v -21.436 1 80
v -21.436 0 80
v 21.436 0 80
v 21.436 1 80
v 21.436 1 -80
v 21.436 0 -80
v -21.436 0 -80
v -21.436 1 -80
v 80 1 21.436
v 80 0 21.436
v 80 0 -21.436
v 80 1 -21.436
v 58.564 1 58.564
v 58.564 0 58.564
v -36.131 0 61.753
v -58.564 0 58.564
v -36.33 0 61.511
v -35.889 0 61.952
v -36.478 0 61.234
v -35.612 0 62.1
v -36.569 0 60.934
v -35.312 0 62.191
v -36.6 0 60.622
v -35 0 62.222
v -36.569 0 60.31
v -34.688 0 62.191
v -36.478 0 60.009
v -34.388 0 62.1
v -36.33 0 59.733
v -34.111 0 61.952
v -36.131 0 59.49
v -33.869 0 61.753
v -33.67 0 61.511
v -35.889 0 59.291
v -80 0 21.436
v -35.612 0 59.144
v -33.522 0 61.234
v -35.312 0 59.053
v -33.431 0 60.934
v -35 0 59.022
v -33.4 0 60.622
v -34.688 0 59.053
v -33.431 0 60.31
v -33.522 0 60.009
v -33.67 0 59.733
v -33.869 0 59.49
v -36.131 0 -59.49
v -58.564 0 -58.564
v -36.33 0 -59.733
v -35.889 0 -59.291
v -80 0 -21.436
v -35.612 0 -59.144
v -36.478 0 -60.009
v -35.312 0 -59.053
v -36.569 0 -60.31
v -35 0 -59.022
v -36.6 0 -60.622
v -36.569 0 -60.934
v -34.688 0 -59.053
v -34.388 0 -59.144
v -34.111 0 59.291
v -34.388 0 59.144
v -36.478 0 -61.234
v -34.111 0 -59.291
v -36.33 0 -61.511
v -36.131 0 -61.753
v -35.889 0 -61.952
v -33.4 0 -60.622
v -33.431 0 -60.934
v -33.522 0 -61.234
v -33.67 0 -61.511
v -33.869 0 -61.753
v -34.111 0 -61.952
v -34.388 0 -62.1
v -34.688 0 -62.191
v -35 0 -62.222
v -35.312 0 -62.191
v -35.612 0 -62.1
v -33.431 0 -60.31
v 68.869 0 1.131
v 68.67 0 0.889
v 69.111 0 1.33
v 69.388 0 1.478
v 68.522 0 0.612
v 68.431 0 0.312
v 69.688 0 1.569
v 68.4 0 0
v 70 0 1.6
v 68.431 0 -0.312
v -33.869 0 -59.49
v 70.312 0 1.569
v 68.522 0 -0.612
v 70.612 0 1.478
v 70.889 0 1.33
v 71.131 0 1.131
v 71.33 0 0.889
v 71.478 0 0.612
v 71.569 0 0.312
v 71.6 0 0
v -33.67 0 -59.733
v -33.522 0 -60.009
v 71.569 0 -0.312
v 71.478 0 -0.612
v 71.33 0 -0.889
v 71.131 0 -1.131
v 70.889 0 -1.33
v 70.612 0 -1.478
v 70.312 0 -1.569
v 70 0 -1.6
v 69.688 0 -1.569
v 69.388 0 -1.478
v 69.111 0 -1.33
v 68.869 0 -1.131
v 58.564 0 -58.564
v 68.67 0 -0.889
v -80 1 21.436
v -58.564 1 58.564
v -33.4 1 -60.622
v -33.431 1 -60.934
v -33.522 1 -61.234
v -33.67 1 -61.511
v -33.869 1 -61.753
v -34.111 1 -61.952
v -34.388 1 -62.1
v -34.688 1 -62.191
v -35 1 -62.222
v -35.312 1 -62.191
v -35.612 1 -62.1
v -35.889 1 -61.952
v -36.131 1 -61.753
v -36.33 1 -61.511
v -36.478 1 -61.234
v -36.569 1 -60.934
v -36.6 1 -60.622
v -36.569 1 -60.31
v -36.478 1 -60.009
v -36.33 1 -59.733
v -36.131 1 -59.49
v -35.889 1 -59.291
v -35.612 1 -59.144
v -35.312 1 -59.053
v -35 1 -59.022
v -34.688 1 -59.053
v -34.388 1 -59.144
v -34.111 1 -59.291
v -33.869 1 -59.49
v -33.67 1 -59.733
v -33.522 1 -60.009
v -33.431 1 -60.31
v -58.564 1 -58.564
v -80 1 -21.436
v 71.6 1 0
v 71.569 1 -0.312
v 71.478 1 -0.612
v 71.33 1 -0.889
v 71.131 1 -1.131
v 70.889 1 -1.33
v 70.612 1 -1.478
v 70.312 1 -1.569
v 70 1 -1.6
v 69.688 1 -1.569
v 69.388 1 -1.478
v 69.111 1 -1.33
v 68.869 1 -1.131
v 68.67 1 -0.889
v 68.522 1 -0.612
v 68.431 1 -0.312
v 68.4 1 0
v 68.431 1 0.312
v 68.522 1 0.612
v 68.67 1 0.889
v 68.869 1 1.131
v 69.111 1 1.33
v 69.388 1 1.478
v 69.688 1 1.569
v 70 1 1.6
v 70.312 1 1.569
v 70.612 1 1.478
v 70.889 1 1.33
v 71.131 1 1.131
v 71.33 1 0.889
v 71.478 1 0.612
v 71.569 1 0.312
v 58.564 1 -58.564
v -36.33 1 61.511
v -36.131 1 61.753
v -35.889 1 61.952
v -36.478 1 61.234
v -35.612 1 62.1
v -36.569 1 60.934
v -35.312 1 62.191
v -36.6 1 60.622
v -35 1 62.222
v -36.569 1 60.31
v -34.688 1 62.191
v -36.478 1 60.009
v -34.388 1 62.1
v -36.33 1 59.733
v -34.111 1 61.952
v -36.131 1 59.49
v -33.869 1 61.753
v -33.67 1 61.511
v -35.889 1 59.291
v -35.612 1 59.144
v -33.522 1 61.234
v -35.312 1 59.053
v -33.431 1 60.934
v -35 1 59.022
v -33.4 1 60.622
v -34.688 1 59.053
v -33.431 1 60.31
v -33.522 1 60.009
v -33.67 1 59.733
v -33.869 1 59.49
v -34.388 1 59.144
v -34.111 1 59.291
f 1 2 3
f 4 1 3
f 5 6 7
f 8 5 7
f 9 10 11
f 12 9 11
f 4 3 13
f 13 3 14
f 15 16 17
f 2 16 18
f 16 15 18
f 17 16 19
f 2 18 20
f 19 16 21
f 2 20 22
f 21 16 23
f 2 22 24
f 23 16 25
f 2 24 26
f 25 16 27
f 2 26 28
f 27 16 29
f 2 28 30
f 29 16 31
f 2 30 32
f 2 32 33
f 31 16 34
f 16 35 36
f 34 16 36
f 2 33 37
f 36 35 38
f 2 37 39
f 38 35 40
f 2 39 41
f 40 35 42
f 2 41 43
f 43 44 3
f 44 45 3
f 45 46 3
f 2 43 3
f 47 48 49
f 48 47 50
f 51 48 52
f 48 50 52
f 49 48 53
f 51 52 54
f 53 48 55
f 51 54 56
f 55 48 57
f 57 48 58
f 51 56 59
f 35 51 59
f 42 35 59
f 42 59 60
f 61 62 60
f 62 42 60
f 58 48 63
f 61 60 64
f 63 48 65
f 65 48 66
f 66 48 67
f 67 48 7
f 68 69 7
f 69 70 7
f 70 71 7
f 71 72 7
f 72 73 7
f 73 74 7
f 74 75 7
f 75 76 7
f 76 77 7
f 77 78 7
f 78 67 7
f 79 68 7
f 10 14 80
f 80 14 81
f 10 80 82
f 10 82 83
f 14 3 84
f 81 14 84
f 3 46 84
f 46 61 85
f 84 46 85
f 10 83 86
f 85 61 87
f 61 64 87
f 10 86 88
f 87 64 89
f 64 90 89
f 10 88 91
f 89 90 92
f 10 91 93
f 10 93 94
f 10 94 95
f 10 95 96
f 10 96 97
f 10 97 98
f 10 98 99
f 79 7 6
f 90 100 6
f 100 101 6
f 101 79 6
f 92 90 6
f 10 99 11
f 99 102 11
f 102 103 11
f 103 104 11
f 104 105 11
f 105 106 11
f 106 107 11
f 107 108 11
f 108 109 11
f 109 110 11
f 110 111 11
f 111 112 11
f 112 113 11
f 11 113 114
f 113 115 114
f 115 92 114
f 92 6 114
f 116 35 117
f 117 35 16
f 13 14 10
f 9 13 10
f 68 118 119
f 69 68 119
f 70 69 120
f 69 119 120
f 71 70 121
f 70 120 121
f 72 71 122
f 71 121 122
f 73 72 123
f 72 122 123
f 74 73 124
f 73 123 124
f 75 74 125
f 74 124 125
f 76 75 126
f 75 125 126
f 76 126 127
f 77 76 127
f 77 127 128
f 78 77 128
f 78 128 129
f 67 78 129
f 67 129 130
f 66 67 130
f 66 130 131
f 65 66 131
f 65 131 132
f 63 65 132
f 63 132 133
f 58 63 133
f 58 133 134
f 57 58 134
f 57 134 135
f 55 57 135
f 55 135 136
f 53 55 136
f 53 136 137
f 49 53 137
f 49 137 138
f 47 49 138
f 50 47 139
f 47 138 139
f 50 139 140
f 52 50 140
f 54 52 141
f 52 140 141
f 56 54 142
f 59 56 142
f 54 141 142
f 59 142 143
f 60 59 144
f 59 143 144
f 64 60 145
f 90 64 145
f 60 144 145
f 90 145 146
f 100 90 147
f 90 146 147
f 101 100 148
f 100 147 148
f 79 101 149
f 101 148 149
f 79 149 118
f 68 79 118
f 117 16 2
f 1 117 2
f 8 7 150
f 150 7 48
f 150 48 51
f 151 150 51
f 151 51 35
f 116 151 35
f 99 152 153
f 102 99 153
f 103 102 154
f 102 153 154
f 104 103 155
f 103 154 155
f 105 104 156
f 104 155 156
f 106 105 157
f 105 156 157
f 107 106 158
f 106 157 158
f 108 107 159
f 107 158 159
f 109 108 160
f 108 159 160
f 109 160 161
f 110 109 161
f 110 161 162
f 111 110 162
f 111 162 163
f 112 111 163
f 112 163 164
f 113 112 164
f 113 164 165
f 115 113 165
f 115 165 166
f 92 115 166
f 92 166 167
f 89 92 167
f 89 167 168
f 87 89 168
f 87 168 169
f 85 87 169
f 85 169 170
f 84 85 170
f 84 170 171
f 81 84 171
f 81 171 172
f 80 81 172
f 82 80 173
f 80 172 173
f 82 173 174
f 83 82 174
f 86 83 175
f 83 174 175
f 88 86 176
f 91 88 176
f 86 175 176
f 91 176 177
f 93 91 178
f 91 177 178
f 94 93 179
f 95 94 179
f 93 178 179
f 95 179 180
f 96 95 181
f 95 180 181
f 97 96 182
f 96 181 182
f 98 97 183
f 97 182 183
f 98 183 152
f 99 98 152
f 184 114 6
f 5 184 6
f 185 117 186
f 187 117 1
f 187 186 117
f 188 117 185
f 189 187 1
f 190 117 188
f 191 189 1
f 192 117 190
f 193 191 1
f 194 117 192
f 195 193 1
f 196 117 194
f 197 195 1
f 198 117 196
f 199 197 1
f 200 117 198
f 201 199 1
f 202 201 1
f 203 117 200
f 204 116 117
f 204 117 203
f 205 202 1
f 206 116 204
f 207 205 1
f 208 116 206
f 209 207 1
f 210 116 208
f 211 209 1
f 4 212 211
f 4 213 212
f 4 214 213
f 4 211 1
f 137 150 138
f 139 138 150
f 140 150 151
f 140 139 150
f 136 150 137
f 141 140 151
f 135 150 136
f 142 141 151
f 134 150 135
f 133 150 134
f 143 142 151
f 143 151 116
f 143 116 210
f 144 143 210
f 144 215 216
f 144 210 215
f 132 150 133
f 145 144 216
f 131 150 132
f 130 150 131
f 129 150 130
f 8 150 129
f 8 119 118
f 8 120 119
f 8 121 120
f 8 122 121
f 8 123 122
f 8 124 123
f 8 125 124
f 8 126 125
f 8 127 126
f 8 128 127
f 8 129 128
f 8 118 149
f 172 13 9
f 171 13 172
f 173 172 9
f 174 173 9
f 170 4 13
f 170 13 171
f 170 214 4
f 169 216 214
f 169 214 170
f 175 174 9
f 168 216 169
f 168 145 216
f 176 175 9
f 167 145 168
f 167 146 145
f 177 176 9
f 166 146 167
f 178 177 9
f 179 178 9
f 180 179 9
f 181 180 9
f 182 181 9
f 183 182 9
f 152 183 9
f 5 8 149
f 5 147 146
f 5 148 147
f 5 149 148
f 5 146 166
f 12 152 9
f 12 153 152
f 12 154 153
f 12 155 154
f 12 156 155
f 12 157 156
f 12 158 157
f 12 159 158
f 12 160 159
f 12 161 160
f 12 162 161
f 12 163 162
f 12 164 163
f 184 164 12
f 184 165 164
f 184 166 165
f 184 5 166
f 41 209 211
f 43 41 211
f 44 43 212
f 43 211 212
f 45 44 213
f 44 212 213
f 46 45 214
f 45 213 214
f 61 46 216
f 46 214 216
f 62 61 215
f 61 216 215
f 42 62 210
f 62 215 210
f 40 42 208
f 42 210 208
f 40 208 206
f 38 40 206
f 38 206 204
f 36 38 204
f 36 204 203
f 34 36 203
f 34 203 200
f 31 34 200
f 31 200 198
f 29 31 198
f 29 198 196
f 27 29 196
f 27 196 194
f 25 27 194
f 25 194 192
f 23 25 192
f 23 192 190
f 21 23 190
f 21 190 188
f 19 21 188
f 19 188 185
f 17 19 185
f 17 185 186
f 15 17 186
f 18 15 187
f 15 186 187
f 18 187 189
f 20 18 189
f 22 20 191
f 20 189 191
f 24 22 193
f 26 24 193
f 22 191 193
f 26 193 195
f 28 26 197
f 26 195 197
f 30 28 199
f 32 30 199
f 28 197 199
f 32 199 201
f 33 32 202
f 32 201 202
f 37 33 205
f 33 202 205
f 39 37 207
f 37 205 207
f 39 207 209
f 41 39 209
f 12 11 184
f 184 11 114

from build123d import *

# Parameters (mm, degrees)
EXTRUDE_1_DEPTH     = 1
CUT_EXTRUDE_1_REACH = 3
SKETCH_2_R          = 1.6
CUT_EXTRUDE_2_REACH = 3
SKETCH_3_R          = 1.6
CUT_EXTRUDE_3_REACH = 3
SKETCH_4_R          = 1.6


with BuildPart() as part:
    # ｽｹｯﾁ1 → ﾎﾞｽ - 押し出し1 (new body)
    with BuildSketch(Plane(origin=(0, 0, 0), x_dir=(1, 0, 0), z_dir=(0, 1, 0))):
        Polygon((-80, -21.435935394), (-58.564064606, -58.564064606), (-21.435935394, -80), (21.435935394, -80), (58.564064606, -58.564064606), (80, -21.435935394), (80, 21.435935394), (58.564064606, 58.564064606), (21.435935394, 80), (-21.435935394, 80), (-58.564064606, 58.564064606), (-80, 21.435935394), align=None)
    extrude(amount=EXTRUDE_1_DEPTH)

    # ｽｹｯﾁ2 → ｶｯﾄ - 押し出し1 (cut, up to next)
    with BuildSketch(Plane(origin=(0, 1, 0), x_dir=(1, 0, 0), z_dir=(0, 1, 0)), mode=Mode.PRIVATE) as cut_extrude_1_sk1:
        with Locations((-35, 60.621778265)):
            Circle(SKETCH_2_R)
    cut_extrude_1_tool1 = extrude(cut_extrude_1_sk1.sketch, amount=-CUT_EXTRUDE_1_REACH, mode=Mode.PRIVATE) & part.part
    add(cut_extrude_1_tool1.solids().sort_by_distance((-35, 1, -60.621778))[0], mode=Mode.SUBTRACT)

    # ｽｹｯﾁ3 → ｶｯﾄ - 押し出し2 (cut, up to next)
    with BuildSketch(Plane(origin=(0, 1, 0), x_dir=(1, 0, 0), z_dir=(0, 1, 0)), mode=Mode.PRIVATE) as cut_extrude_2_sk1:
        with Locations((-35, -60.621778265)):
            Circle(SKETCH_3_R)
    cut_extrude_2_tool1 = extrude(cut_extrude_2_sk1.sketch, amount=-CUT_EXTRUDE_2_REACH, mode=Mode.PRIVATE) & part.part
    add(cut_extrude_2_tool1.solids().sort_by_distance((-35, 1, 60.621778))[0], mode=Mode.SUBTRACT)

    # ｽｹｯﾁ4 → ｶｯﾄ - 押し出し3 (cut, up to next)
    with BuildSketch(Plane(origin=(0, 1, 0), x_dir=(1, 0, 0), z_dir=(0, 1, 0)), mode=Mode.PRIVATE) as cut_extrude_3_sk1:
        with Locations((70, 0)):
            Circle(SKETCH_4_R)
    cut_extrude_3_tool1 = extrude(cut_extrude_3_sk1.sketch, amount=-CUT_EXTRUDE_3_REACH, mode=Mode.PRIVATE) & part.part
    add(cut_extrude_3_tool1.solids().sort_by_distance((70, 1, 0))[0], mode=Mode.SUBTRACT)


solid = part.part
